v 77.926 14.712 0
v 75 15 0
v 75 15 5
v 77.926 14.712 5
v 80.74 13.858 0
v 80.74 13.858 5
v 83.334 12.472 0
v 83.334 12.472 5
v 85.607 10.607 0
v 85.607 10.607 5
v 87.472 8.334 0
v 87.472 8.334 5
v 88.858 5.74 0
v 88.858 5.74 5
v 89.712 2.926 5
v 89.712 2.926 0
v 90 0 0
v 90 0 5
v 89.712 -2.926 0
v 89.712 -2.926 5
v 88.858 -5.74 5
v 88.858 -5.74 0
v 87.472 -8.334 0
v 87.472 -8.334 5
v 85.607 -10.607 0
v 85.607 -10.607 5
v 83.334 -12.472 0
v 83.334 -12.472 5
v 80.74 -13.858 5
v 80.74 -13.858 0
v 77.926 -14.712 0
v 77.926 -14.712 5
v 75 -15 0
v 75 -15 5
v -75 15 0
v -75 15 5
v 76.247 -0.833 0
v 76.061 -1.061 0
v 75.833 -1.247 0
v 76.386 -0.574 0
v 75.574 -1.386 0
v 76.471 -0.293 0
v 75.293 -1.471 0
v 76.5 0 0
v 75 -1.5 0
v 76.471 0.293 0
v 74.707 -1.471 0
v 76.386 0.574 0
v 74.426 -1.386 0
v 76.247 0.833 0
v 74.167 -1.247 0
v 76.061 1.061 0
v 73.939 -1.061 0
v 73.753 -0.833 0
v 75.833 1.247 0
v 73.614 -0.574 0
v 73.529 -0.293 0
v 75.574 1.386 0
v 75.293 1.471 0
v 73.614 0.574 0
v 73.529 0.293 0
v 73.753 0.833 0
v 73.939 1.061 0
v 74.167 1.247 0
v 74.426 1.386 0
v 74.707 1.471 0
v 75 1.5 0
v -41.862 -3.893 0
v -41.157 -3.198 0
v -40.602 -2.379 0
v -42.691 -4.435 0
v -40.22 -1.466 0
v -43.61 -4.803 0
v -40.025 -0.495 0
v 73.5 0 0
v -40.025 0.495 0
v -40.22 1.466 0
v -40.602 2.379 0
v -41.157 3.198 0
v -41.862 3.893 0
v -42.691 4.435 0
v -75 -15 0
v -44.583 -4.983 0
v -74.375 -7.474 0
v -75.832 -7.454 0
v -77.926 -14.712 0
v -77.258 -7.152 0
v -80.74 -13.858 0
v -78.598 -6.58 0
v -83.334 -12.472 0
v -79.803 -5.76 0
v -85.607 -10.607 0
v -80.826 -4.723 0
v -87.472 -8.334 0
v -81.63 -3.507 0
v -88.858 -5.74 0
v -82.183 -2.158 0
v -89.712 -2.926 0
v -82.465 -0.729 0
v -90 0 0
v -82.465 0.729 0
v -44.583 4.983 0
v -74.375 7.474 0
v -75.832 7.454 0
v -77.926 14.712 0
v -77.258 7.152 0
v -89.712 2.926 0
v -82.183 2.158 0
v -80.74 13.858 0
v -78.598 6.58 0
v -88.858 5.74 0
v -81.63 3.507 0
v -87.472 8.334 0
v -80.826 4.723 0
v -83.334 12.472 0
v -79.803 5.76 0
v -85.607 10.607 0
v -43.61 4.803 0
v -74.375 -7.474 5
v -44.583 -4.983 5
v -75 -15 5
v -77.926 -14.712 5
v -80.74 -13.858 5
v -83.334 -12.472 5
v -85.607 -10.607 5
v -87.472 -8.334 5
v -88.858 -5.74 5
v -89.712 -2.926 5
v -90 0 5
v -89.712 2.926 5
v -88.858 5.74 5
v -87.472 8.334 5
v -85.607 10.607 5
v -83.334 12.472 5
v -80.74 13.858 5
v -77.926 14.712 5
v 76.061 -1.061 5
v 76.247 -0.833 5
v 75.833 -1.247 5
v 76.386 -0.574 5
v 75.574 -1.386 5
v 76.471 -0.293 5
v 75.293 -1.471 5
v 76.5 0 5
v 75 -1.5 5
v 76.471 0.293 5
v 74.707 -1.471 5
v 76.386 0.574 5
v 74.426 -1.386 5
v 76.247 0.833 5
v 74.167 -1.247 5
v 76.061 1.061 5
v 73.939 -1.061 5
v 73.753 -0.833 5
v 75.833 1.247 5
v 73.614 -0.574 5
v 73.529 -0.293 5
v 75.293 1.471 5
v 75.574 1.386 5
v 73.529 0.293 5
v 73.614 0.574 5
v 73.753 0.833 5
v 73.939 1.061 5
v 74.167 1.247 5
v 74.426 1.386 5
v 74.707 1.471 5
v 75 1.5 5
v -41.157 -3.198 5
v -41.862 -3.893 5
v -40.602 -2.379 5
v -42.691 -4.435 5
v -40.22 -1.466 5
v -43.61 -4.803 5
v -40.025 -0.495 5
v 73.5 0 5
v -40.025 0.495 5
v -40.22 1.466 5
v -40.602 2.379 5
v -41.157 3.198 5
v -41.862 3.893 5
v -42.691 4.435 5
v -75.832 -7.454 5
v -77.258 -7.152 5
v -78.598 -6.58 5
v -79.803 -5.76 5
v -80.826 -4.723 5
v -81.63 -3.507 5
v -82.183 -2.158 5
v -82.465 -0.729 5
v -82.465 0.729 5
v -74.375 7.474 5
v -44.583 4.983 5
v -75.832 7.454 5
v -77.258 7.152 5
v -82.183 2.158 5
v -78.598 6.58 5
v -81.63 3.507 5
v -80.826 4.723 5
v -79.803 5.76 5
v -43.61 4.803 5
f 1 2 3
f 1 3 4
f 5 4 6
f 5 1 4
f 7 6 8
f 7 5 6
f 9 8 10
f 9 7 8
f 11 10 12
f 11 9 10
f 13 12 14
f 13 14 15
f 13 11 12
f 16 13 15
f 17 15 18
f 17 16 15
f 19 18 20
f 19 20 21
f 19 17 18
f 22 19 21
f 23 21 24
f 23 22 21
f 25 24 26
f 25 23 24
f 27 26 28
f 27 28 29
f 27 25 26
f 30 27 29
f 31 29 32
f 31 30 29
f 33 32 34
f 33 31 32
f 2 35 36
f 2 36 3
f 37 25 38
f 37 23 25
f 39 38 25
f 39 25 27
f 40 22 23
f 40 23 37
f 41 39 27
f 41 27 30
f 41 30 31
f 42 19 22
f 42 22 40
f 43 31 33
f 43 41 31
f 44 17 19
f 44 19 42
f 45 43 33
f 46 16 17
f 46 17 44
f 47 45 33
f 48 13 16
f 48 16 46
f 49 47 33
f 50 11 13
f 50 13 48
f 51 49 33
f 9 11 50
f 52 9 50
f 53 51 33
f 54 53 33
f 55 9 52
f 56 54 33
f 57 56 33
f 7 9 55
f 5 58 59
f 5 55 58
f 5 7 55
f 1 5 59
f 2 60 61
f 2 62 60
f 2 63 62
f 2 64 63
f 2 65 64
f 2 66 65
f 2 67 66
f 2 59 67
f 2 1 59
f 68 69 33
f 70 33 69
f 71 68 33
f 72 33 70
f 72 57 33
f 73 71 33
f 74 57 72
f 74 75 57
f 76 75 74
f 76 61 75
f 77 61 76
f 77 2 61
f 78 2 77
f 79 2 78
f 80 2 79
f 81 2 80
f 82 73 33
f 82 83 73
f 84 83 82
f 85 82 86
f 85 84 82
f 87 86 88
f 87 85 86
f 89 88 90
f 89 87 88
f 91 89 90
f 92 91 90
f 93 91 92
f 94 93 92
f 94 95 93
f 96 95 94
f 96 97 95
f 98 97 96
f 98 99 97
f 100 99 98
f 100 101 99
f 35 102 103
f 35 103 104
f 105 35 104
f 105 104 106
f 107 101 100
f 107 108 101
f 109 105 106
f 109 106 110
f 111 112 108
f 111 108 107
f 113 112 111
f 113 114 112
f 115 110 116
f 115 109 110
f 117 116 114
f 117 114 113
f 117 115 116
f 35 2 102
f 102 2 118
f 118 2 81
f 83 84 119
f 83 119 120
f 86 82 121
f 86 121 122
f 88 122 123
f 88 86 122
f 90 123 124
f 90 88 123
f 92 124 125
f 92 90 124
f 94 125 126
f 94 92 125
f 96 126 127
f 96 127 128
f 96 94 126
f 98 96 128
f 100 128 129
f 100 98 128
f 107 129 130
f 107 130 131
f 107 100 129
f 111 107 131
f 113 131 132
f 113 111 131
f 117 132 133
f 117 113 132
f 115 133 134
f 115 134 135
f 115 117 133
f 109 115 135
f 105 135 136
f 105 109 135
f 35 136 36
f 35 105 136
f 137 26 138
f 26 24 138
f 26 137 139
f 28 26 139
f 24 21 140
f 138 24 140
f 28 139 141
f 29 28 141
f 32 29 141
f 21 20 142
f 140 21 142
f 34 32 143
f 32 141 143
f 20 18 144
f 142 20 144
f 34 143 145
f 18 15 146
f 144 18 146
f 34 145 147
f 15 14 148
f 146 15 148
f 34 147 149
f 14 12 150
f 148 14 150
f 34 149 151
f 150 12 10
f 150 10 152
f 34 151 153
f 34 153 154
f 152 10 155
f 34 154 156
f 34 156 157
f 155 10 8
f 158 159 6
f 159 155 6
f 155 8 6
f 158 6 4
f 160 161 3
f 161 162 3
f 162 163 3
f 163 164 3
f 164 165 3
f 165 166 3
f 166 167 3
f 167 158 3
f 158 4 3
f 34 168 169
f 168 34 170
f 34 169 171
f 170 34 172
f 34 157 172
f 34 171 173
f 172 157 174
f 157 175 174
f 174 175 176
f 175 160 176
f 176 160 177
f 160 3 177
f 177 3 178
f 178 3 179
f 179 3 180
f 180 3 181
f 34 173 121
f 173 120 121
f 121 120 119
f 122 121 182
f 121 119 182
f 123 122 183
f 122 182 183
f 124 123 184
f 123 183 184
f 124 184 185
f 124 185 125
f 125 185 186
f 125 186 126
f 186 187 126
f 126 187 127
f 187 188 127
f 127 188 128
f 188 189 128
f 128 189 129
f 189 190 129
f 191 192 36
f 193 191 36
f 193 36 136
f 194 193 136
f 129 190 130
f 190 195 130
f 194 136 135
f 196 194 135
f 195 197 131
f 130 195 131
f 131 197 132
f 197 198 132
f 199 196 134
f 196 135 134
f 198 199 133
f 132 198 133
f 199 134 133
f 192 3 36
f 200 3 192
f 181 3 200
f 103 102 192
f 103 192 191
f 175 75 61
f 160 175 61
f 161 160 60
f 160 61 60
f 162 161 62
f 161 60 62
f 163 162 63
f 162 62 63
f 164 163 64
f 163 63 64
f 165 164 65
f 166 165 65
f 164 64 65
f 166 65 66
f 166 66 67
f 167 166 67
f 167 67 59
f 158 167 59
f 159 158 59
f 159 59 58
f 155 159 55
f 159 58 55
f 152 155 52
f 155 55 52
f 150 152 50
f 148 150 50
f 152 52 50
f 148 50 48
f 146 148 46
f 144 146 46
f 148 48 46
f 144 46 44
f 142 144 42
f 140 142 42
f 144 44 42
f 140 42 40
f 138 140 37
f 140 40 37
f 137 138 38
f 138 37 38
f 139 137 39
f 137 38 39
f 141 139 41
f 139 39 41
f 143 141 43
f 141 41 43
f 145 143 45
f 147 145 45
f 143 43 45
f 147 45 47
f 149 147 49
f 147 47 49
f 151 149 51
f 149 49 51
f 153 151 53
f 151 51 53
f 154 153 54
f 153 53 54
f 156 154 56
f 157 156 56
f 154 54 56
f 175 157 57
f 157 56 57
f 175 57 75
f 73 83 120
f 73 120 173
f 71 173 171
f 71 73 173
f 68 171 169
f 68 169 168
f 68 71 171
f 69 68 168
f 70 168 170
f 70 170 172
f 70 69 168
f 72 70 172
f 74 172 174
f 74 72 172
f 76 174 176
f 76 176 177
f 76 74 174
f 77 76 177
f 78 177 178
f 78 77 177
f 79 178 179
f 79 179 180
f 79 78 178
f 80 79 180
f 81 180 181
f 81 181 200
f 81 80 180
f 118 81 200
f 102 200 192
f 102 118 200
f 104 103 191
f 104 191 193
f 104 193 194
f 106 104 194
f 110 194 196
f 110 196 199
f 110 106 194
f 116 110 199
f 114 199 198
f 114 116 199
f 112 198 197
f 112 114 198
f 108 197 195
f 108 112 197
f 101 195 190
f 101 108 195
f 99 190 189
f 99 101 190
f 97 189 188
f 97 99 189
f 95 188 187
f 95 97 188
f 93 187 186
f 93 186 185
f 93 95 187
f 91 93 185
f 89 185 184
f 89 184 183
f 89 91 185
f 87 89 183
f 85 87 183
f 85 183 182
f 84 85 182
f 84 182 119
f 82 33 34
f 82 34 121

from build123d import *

# Parameters (mm, degrees)
BOSS_EXTRUDE1_DEPTH = 5
SKETCH4_R           = 1.5
CUT_EXTRUDE1_DEPTH  = 5


with BuildPart() as part:
    # Sketch2 → Boss-Extrude1 (new body)
    with BuildSketch(Plane.XY):
        with BuildLine():
            Line((-75, 15), (75, 15))
            ThreePointArc((75, 15), (90, 0), (75, -15))
            Line((75, -15), (-75, -15))
            ThreePointArc((-75, -15), (-90, 0), (-75, 15))
        make_face()
    extrude(amount=BOSS_EXTRUDE1_DEPTH)

    # Sketch4 → Cut-Extrude1 (cut)
    with BuildSketch(Plane(origin=(0, 0, 0), x_dir=(-1, 0, 0), z_dir=(0, 0, -1))):
        with Locations((-75, 0)):
            Circle(SKETCH4_R)
        with BuildLine():
            Line((44.583333333, 4.982608643), (74.375, 7.473912964))
            ThreePointArc((74.375, 7.473912964), (82.5, 0), (74.375, -7.473912964))
            Line((74.375, -7.473912964), (44.583333333, -4.982608643))
            ThreePointArc((44.583333333, -4.982608643), (40, 0), (44.583333333, 4.982608643))
        make_face()
    extrude(amount=-CUT_EXTRUDE1_DEPTH, mode=Mode.SUBTRACT)


solid = part.part
